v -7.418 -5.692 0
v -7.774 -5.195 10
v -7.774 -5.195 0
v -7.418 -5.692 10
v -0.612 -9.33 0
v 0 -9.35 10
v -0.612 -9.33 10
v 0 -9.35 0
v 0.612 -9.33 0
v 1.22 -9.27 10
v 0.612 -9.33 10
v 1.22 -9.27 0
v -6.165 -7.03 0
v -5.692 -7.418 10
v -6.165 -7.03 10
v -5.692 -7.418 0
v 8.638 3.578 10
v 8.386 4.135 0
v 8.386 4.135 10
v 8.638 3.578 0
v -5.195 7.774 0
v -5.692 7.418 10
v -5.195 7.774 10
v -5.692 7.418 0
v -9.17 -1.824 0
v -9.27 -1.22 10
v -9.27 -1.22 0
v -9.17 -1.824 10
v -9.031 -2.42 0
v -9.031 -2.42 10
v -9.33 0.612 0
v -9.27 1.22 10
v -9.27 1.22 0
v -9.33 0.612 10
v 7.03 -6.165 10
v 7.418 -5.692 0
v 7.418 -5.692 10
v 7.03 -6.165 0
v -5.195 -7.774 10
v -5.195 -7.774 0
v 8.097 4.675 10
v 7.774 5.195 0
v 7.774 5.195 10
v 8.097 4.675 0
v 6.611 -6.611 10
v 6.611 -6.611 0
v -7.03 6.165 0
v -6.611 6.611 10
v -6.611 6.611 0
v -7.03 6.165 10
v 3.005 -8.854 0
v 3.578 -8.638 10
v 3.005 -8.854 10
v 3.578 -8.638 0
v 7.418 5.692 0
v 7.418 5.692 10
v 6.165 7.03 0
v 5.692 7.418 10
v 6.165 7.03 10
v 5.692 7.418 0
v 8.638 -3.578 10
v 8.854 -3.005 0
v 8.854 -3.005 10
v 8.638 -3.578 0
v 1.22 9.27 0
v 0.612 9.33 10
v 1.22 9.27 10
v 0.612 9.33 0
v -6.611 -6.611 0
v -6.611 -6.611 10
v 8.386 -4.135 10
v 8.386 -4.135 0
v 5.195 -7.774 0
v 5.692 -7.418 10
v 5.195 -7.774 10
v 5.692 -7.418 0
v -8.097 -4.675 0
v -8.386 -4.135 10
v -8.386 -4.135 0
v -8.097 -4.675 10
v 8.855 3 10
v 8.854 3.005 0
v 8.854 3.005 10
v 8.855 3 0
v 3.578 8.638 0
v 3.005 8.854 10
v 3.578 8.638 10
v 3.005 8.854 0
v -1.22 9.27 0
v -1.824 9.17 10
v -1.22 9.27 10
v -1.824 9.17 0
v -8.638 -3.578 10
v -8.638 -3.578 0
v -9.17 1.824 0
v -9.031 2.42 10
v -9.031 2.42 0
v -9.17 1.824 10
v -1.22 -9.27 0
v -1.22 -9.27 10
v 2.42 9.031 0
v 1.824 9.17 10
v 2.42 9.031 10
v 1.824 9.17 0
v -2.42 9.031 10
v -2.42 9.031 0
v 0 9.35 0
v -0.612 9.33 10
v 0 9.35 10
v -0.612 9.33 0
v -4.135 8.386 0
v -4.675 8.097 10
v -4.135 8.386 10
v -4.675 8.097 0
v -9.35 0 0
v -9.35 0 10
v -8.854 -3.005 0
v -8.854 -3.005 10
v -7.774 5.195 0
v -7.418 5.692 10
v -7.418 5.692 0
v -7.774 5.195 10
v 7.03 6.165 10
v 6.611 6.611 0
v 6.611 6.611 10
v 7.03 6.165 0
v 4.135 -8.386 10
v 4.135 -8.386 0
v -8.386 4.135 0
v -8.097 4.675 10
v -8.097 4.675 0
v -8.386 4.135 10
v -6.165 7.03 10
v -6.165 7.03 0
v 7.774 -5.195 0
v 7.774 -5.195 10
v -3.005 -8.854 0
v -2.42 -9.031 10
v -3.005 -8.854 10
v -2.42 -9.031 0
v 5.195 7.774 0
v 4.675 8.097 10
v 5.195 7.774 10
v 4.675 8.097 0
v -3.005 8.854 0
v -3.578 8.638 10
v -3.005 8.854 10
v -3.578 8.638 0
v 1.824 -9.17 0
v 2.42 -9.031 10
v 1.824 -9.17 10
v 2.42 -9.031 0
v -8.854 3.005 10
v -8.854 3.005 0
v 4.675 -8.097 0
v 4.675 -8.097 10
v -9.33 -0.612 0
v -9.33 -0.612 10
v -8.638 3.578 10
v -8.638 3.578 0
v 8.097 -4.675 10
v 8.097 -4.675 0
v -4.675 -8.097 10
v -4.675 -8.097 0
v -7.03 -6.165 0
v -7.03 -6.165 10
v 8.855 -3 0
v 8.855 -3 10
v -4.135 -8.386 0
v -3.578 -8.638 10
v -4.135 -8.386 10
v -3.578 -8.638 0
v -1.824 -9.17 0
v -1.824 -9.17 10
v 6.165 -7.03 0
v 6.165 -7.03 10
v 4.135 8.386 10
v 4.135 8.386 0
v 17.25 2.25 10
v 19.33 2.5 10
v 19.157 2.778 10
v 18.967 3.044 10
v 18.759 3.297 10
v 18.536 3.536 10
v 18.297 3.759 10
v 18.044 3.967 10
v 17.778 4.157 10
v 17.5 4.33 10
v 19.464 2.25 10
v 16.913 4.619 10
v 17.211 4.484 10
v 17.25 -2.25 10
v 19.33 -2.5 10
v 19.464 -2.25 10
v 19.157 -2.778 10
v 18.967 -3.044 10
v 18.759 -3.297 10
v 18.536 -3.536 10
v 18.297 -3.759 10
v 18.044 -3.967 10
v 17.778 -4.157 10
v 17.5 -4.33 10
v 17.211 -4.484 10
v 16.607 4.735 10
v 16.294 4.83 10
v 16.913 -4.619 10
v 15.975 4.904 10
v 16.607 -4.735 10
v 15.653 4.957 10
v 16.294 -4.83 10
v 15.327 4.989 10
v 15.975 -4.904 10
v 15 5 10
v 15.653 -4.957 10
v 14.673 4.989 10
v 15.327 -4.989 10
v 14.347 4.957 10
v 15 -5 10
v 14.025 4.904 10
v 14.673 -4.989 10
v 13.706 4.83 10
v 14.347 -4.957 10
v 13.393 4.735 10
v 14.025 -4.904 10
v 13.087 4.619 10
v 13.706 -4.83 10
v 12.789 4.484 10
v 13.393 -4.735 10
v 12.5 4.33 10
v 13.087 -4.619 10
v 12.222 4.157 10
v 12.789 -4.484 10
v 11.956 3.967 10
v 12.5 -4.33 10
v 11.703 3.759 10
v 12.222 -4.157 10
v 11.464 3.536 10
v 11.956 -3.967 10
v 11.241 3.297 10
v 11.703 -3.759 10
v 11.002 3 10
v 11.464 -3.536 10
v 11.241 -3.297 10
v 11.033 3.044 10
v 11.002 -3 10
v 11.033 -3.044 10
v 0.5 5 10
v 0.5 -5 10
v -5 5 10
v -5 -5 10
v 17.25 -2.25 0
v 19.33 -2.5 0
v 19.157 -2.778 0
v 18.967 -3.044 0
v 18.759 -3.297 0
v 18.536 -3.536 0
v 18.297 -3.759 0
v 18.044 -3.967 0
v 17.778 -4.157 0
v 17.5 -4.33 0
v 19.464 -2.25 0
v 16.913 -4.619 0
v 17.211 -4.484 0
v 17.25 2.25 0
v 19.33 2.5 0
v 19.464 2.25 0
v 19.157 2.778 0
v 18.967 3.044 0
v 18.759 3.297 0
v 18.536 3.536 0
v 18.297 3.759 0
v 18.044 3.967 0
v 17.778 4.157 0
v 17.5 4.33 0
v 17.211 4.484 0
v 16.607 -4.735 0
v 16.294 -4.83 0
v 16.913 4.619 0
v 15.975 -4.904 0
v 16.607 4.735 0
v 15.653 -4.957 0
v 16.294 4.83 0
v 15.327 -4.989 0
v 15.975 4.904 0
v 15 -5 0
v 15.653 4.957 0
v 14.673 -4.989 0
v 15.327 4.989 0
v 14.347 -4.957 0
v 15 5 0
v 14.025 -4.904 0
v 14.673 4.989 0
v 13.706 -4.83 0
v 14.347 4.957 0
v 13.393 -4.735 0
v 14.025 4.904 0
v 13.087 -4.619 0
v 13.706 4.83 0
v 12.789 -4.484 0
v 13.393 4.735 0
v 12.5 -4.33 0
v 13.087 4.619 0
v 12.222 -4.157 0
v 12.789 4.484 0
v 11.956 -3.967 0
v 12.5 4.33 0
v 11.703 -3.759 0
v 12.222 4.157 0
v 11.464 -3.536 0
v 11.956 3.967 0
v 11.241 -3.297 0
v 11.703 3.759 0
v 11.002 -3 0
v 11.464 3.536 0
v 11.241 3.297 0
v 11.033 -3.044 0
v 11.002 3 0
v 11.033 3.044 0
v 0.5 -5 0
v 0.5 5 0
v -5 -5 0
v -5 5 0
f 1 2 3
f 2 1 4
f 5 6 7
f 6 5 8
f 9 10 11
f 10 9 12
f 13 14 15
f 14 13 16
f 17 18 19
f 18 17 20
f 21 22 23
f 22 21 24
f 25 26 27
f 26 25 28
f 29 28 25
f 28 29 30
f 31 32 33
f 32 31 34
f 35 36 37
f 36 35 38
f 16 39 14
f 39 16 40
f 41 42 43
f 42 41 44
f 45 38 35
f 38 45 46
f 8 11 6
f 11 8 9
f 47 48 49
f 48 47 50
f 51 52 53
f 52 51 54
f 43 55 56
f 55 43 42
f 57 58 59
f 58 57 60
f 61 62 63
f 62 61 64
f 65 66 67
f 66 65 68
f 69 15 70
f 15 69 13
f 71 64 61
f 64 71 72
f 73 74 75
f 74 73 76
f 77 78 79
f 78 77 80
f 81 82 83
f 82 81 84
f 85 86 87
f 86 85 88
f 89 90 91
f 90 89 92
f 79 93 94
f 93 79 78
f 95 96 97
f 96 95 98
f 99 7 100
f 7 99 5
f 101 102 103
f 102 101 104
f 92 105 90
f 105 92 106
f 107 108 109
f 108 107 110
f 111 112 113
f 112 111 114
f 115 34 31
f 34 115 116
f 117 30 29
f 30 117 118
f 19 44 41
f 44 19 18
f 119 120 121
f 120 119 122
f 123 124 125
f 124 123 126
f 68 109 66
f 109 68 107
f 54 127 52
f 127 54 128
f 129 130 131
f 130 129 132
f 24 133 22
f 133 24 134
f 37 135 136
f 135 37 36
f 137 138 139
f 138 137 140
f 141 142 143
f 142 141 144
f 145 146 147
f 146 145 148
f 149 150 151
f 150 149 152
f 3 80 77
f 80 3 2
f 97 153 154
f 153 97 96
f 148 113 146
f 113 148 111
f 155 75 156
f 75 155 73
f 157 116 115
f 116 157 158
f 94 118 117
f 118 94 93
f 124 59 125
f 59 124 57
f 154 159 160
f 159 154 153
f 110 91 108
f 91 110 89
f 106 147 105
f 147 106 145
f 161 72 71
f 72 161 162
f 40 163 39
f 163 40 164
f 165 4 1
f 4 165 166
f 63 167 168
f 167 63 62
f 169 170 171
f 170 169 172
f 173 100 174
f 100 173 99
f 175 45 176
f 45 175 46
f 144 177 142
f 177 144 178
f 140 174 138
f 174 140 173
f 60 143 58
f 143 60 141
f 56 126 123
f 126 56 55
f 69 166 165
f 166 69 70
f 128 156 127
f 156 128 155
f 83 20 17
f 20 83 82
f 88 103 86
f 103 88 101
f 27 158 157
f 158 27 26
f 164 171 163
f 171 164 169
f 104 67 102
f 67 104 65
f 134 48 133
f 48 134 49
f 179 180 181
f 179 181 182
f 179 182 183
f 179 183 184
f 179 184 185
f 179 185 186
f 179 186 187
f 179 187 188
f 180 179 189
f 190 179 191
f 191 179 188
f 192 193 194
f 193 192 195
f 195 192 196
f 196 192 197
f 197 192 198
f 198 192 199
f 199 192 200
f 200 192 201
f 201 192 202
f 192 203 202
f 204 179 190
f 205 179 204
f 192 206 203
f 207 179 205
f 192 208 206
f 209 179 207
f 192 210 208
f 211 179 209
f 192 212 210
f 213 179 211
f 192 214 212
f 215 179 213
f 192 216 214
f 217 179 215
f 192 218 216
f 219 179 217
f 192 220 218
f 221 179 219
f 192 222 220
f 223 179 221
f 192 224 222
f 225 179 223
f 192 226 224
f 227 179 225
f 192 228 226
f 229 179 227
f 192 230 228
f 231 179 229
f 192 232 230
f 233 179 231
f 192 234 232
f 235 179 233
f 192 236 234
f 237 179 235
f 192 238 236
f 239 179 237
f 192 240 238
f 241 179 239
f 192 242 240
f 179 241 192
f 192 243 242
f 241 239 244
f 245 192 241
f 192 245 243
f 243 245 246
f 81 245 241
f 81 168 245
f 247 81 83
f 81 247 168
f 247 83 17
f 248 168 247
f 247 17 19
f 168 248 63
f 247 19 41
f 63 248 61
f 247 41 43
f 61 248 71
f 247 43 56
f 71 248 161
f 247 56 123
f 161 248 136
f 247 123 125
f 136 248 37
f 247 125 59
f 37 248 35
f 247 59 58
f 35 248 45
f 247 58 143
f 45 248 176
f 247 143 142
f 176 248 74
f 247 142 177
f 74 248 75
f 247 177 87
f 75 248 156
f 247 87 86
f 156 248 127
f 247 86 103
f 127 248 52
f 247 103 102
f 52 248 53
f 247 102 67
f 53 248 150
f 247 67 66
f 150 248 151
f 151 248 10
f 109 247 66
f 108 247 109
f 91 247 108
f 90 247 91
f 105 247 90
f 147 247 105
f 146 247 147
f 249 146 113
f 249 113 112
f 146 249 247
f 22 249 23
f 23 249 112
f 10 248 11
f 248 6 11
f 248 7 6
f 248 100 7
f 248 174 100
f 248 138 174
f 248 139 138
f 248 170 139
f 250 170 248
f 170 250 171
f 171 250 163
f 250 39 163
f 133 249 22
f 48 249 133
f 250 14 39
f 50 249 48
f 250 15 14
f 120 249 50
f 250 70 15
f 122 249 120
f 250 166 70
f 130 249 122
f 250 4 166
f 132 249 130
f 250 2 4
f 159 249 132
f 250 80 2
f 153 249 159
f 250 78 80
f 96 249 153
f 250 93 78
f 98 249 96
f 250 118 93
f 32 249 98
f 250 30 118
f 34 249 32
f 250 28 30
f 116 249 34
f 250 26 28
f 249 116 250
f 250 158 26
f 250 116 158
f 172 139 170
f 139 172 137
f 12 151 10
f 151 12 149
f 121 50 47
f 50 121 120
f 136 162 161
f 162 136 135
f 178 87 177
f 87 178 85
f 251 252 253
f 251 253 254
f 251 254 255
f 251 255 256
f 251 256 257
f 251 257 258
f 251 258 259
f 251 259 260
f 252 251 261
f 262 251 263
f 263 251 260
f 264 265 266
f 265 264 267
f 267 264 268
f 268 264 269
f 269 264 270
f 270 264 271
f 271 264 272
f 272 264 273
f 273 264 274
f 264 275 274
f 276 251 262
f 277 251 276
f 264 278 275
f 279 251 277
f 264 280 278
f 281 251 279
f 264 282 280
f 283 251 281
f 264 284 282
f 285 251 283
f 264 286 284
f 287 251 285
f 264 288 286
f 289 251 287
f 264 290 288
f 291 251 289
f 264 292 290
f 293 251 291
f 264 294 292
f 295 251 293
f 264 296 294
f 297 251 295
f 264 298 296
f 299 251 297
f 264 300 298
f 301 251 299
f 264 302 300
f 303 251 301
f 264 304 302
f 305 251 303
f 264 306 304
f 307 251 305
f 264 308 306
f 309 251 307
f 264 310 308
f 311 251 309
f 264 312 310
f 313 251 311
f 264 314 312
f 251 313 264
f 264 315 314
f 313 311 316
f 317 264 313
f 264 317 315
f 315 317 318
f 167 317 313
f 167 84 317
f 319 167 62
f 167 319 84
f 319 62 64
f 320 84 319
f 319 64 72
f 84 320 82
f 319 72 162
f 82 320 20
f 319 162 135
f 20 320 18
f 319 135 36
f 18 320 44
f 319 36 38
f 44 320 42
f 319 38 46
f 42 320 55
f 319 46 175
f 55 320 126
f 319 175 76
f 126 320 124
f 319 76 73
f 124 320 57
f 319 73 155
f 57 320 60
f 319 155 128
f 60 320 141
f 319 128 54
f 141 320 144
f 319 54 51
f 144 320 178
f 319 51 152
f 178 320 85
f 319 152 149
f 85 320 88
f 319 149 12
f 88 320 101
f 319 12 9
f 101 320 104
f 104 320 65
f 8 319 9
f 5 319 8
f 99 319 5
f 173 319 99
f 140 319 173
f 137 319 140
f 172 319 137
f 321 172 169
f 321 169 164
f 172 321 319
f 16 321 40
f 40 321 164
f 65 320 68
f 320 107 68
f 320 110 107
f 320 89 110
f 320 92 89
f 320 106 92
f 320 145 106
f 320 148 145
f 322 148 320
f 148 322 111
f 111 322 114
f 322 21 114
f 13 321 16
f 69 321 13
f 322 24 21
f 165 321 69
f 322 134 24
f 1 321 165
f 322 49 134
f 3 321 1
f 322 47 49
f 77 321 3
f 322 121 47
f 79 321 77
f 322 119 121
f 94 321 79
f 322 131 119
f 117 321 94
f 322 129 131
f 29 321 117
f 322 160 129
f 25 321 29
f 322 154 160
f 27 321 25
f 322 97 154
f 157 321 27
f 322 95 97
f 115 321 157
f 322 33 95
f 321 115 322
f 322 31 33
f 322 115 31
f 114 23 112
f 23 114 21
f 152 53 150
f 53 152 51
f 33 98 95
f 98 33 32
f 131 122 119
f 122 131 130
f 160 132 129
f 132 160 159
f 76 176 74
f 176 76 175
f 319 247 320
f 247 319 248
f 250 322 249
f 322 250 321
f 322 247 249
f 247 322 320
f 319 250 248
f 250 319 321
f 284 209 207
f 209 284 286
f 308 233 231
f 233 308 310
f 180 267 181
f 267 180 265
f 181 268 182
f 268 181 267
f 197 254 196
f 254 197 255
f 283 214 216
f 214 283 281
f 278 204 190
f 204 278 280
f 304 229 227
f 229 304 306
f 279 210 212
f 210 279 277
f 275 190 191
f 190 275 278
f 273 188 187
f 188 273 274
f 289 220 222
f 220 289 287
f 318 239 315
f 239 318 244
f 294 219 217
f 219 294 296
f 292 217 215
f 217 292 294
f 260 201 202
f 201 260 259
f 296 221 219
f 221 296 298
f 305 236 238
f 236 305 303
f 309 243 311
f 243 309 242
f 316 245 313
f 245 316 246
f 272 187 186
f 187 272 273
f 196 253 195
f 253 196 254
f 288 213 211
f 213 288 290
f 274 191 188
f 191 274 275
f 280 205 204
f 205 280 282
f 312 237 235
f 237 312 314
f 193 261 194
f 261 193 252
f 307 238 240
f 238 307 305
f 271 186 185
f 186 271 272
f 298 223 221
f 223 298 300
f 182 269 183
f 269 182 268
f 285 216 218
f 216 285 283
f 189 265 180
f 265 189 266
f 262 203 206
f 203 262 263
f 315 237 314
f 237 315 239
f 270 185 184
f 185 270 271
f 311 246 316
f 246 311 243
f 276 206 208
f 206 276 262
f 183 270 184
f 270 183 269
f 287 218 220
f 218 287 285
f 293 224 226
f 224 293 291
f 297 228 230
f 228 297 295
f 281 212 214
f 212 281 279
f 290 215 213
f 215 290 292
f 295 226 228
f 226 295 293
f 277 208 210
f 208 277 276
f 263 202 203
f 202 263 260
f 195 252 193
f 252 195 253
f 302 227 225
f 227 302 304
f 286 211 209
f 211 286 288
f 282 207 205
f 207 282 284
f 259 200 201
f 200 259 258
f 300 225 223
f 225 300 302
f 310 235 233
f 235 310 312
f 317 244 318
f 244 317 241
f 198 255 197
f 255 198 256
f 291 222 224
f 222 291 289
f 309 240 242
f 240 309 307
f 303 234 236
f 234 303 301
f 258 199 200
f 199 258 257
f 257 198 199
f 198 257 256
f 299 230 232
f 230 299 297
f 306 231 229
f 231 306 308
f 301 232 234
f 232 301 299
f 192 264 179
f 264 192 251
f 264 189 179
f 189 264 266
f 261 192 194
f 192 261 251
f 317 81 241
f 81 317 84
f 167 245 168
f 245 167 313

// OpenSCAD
// Snap-on tubing clip for 12.7 mm lab stand rod
// Print orientation: flat on bed, extrusion along +Z

$fn = 96;

// ---- Dimensions (mm) ----
rod_d        = 12.7;   // stand rod diameter
rod_wall     = 3;      // rod ring wall thickness
rod_open     = 10;     // rod ring opening width (-X side)

tube_d       = 6;      // tubing inner diameter
tube_wall    = 2;      // tubing ring wall thickness
tube_open    = 4.5;    // tubing ring opening width (+X side)

bridge_w     = 6;      // solid bridge width (Y)
bridge_x0    = 8;      // solid bridge start (X)
bridge_x1    = 12;     // solid bridge end (X)

height       = 10;     // extrusion height (Z)
eps          = 0.5;    // cutter overshoot past faces

// ---- Derived ----
rod_od = rod_d + 2 * rod_wall;

module rod_ring() {
    difference() {
        translate([0, 0, 0])
            cylinder(d = rod_od, h = height);
        // Opening on -X side (x < 0, -5 < y < 5)
        translate([-rod_open / 2, -5, -eps])
            cube([rod_open / 2 + eps, 10, height + 2 * eps]);
    }
}

module tube_ring() {
    difference() {
        translate([15, 0, 0])
            cylinder(d = tube_d + 2 * tube_wall, h = height);
        // Opening on +X side (x > 15, -2.25 < y < 2.25)
        translate([15 + tube_open / 2, -tube_open / 2, -eps])
            cube([tube_open / 2 + eps, tube_open, height + 2 * eps]);
    }
}

module solid_bridge() {
    translate([bridge_x0, -bridge_w / 2, 0])
        cube([bridge_x1 - bridge_x0, bridge_w, height]);
}

union() {
    rod_ring();
    tube_ring();
    solid_bridge();
}
